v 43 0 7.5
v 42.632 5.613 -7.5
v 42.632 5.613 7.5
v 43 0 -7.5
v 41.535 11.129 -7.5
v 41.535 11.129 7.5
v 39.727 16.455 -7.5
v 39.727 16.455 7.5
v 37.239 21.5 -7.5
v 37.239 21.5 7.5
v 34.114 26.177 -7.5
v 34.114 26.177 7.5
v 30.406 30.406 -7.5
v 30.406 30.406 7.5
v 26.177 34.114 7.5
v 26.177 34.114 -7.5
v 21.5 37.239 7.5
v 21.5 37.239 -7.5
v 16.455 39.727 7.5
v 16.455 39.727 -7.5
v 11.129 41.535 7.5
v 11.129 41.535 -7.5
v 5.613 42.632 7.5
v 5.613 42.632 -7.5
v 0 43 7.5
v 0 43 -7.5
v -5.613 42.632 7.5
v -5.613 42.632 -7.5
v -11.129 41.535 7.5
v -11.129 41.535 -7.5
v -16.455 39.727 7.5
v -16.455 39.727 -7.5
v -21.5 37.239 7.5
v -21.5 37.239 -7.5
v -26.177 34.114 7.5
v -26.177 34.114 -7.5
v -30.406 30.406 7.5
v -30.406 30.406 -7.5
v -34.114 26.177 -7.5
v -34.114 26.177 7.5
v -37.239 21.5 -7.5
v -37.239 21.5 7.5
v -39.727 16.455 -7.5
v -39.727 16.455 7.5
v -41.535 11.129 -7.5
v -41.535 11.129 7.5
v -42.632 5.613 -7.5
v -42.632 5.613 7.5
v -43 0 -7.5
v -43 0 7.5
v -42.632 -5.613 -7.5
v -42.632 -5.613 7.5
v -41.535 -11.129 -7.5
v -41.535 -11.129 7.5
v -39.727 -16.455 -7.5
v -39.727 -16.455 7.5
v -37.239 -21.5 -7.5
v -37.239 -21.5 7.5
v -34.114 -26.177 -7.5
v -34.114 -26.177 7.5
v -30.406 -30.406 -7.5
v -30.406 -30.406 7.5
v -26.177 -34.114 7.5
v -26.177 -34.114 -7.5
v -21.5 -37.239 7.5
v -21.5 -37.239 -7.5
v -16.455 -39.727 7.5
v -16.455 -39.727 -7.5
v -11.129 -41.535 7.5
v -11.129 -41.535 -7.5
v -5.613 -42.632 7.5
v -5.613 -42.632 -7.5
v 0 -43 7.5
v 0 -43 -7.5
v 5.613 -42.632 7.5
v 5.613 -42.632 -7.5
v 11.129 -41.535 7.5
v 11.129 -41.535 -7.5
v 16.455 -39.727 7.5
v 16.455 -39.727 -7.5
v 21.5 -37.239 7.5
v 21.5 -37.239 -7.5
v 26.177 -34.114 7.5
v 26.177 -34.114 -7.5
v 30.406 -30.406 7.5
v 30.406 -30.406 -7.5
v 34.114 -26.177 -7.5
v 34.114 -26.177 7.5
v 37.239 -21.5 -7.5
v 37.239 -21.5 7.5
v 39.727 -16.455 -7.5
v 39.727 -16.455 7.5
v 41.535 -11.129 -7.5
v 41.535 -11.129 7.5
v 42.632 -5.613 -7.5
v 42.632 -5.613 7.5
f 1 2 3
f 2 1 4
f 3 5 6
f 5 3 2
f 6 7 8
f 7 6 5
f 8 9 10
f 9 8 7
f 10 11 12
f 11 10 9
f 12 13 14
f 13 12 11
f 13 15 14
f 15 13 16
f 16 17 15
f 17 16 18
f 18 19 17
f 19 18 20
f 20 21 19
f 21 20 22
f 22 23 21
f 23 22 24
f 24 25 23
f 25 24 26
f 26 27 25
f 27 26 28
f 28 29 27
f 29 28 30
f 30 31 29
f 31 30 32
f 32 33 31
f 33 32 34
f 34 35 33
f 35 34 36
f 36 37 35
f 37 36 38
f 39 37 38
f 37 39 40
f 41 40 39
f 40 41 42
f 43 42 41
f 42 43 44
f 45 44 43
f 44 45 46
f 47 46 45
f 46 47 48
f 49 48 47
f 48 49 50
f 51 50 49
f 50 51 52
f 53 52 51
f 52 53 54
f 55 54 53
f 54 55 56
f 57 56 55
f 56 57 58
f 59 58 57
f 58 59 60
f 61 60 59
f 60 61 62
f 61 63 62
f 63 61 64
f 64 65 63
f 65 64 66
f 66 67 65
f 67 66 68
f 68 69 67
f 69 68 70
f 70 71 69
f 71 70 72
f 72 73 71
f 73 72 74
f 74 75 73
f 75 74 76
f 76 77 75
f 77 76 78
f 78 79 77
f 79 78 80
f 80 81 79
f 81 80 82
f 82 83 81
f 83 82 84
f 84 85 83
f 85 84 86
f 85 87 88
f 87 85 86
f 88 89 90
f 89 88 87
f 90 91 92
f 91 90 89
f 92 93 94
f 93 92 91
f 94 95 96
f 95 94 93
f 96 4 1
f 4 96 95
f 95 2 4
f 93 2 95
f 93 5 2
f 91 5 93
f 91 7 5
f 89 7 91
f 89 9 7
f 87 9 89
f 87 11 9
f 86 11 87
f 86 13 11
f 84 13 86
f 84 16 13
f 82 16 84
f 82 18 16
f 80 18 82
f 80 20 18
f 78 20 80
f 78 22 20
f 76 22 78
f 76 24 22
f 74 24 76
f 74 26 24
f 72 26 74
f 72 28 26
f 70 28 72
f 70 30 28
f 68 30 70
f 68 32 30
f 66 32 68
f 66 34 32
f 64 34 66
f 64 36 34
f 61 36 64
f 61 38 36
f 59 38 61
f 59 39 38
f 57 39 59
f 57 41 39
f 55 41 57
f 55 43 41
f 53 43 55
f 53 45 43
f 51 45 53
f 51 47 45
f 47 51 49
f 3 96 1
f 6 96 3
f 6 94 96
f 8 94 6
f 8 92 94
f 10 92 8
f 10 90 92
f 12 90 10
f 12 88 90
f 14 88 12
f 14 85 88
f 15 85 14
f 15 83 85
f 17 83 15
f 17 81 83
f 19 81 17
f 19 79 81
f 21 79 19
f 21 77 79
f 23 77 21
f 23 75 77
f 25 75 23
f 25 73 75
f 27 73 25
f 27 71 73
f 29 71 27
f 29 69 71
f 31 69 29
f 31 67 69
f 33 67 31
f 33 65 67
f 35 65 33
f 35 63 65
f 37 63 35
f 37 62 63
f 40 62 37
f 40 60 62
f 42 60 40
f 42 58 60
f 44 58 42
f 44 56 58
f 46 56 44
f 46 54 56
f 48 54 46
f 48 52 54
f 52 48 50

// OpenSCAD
// ========================================
// a cylinder with radius 43 mm and height 15 mm
// NeuroCAD canonical IR; dimensions are millimetres
// ========================================
$fn = 48;

cylinder(r=43, h=15, center=true);
